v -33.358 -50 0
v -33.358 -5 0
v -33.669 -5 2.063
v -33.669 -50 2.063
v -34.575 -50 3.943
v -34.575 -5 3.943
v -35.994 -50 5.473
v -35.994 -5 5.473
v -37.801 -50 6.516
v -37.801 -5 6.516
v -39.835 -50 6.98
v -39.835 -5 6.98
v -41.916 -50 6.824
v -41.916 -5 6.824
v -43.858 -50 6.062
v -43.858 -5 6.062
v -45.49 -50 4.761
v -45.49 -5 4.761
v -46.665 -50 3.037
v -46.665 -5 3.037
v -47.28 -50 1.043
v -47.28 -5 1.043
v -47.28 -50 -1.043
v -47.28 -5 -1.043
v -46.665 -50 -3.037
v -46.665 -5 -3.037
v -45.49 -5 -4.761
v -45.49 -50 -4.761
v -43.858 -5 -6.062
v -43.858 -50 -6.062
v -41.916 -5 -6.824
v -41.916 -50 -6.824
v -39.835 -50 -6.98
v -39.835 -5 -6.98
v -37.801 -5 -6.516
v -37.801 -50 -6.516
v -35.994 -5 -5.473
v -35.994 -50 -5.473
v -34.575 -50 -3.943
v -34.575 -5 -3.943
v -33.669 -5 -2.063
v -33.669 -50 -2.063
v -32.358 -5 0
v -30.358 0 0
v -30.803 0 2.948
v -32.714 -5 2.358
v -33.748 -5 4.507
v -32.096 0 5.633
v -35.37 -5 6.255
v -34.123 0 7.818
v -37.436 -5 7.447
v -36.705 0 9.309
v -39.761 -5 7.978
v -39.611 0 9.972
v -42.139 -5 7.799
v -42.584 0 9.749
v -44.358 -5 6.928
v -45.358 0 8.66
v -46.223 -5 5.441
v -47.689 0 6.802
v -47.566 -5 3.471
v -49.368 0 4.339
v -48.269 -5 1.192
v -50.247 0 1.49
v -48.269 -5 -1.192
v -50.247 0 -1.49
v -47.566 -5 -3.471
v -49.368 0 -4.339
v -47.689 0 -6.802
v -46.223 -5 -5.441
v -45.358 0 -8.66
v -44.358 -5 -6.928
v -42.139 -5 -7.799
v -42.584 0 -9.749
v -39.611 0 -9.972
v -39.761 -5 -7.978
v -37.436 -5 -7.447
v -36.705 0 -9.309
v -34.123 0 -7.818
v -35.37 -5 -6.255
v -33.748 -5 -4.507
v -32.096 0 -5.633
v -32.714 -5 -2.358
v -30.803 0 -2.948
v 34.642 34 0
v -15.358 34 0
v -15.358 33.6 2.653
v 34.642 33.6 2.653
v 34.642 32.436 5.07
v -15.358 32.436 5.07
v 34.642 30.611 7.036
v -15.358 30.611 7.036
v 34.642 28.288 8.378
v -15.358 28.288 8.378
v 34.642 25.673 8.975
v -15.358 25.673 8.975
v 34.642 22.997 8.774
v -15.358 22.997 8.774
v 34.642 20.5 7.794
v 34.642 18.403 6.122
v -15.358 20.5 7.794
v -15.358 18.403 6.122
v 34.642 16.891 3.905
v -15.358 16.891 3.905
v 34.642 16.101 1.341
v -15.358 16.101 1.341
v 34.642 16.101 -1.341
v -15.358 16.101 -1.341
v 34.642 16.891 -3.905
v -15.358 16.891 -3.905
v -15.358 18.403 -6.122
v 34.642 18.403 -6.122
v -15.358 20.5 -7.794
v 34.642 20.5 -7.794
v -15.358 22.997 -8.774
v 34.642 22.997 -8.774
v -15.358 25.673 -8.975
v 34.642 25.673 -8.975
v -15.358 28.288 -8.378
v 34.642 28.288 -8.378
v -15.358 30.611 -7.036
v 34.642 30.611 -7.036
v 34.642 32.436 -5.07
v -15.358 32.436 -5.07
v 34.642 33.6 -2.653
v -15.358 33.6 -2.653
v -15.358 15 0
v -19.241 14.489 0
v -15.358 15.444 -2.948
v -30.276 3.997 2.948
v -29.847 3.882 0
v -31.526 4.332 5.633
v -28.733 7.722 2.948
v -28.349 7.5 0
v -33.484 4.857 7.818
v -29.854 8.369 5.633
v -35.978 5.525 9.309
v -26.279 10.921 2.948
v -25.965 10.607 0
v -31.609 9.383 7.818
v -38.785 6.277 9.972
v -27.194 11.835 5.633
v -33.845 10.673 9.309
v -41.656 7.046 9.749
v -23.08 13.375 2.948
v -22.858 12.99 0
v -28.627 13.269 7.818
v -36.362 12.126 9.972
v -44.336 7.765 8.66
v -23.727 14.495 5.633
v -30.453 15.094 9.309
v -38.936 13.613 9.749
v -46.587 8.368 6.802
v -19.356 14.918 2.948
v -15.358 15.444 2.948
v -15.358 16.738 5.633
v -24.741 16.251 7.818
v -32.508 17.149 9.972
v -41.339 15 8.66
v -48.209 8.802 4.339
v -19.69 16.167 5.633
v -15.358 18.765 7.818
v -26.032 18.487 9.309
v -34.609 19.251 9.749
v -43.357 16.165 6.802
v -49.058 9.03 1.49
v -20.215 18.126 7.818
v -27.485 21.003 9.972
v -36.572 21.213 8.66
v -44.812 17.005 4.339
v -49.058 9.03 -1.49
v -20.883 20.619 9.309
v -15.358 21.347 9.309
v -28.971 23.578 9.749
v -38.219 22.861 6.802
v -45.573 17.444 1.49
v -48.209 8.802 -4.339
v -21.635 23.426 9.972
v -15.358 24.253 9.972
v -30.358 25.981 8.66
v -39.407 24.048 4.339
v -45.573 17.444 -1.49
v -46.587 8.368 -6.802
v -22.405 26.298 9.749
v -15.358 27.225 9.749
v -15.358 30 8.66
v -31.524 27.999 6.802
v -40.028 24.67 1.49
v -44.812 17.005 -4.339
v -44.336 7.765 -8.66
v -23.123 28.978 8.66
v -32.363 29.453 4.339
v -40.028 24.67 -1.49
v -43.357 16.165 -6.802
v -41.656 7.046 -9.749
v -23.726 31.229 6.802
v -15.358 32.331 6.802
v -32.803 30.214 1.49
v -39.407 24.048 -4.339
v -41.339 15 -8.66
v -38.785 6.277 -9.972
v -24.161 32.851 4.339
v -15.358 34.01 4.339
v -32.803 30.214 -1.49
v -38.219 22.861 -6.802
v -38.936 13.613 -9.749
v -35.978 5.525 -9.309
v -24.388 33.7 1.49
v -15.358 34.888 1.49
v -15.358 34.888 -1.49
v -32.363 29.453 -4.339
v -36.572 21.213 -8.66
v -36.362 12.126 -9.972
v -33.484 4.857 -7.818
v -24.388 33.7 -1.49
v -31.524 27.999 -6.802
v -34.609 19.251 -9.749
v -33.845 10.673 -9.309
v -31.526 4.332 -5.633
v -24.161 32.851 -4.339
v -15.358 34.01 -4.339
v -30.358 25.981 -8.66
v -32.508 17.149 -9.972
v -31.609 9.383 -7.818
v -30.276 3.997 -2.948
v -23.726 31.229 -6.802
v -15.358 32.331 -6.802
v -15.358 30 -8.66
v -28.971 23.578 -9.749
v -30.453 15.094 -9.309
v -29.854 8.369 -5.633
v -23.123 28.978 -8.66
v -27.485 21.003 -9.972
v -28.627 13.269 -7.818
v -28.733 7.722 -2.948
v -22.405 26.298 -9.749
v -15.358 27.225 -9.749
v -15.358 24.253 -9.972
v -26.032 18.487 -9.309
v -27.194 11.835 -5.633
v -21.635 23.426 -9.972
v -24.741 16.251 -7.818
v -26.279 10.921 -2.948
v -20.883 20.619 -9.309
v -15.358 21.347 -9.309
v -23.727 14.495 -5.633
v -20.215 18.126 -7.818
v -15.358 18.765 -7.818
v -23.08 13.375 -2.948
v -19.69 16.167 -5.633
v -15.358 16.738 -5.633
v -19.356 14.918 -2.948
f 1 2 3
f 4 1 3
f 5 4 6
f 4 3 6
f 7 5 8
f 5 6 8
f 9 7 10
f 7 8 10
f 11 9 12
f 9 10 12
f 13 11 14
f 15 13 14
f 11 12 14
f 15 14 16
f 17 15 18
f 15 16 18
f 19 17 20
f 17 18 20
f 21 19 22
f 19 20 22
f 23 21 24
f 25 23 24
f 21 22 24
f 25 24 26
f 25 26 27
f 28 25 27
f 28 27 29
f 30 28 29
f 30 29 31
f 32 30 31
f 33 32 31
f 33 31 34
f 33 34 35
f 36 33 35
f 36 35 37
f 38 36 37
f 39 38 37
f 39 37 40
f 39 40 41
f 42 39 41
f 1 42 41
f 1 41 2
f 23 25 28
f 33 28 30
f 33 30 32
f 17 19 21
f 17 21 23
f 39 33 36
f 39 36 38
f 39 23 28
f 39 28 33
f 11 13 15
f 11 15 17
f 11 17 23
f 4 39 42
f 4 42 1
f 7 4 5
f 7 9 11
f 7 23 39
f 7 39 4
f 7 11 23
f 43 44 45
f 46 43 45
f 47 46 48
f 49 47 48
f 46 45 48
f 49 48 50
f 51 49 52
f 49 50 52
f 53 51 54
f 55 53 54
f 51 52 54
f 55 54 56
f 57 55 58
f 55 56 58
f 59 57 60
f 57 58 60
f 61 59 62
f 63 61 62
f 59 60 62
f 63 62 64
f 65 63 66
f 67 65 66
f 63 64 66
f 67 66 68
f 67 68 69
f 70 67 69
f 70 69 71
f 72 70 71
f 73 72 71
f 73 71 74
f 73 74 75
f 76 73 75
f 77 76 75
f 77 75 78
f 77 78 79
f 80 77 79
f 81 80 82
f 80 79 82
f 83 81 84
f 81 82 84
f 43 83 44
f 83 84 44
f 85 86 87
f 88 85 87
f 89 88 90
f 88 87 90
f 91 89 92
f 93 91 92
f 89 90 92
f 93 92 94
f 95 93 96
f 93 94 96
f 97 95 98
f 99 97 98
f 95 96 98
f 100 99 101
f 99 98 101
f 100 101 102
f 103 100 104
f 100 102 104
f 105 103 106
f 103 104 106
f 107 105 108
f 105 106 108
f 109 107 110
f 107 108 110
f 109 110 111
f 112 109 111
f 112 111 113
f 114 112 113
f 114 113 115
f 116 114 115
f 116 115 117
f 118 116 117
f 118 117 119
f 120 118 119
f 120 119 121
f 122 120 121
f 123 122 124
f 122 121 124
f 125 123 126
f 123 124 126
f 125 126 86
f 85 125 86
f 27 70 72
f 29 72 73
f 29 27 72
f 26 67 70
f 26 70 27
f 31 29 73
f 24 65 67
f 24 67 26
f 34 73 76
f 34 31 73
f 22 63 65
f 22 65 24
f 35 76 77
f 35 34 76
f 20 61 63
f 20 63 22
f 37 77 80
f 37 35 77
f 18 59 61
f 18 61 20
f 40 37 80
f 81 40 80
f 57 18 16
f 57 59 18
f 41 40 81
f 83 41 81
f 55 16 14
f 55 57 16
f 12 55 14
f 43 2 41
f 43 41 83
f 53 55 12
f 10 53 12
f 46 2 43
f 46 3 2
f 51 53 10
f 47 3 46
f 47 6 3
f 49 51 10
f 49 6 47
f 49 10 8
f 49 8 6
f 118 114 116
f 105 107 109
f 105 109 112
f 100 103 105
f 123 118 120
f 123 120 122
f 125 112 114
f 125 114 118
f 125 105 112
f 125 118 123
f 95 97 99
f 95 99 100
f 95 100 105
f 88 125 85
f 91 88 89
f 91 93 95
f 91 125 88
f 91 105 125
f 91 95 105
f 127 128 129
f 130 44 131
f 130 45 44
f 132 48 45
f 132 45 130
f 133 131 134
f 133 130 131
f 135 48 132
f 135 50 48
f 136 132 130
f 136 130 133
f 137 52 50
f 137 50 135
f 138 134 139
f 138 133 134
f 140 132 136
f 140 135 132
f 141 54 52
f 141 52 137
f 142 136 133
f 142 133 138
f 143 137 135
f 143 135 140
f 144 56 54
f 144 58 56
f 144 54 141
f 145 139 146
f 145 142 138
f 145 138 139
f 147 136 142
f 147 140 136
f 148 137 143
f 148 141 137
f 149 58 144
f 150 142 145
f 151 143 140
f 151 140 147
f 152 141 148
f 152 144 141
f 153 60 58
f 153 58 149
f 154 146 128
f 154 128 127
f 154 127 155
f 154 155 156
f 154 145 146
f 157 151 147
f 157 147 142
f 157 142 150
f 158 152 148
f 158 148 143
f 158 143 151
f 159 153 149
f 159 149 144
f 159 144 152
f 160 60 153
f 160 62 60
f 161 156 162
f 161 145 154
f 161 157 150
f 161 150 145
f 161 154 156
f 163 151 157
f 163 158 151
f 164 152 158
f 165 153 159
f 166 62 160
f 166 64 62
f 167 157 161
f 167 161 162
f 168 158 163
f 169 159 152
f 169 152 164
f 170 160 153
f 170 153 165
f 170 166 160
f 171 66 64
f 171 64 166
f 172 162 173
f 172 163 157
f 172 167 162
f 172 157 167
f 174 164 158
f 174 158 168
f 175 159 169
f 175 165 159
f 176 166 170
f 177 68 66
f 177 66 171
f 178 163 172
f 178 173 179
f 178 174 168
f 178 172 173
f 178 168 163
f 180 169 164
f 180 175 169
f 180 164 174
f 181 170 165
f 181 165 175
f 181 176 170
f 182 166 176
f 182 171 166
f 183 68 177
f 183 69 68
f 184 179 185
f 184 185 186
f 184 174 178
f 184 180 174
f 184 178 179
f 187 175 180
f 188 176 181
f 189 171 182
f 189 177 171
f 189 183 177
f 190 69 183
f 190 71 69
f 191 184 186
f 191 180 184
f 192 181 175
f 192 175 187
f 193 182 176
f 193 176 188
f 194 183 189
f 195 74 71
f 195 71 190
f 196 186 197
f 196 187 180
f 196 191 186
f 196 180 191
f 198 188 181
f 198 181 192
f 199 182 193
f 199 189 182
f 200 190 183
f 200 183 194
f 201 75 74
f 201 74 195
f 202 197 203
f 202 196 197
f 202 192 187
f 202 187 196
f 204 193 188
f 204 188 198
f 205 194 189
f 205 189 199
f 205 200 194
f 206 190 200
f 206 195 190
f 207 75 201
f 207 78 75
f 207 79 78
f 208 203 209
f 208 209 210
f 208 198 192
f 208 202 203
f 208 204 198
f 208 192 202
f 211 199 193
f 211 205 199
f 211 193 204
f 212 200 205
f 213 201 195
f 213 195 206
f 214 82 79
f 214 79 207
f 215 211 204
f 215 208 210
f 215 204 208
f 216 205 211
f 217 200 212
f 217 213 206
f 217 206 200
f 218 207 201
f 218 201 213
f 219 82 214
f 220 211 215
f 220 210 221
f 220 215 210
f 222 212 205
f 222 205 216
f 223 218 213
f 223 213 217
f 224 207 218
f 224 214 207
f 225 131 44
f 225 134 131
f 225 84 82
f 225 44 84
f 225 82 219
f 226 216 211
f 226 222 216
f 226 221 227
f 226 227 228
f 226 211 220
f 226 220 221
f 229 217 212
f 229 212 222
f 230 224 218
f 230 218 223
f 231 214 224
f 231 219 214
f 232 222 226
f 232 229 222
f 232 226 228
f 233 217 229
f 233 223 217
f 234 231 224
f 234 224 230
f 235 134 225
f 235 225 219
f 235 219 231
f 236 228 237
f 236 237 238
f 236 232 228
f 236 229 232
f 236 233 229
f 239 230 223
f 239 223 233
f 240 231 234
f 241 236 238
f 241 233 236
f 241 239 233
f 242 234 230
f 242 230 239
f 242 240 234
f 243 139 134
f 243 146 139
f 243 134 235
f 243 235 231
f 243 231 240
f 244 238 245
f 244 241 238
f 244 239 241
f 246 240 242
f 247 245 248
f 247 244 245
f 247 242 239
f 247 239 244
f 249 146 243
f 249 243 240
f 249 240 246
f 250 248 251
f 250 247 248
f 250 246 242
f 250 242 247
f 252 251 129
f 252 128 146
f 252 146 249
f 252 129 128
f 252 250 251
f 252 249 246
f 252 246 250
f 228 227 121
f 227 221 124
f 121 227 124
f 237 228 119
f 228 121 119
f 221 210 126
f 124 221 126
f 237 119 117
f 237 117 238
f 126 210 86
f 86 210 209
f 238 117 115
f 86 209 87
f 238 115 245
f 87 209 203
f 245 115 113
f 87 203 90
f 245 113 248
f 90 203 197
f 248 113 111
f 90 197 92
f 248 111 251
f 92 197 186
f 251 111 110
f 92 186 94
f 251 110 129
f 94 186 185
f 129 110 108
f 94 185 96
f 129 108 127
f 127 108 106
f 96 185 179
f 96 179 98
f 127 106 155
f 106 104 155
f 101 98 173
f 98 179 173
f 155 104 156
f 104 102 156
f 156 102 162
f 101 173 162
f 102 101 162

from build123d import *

# Parameters (mm, degrees)
F0_R     = 10
F3_ANGLE = 90
F4_R     = 7
F5_DEPTH = 50
F6_R     = 9
F7_DEPTH = 50
F8_DEPTH = 5
F9_SIZE2 = 4.99999
F9_SIZE  = 1.99999


# Not quite as in the source:
# - a fillet or chamfer is up to 0.001 mm smaller than in the source, because OpenCascade refuses the exact size


with BuildPart() as f3:
    # F0 (on Front) → F3 (revolve)
    with BuildSketch(Plane.XZ):
        with Locations((-40.3583608249, 0)):
            Circle(F0_R)
    revolve(axis=Axis((-15.3583608249, 0, 6.4160241745), (0, 0, -1)), revolution_arc=F3_ANGLE)

    # F6 (on face) → F7 (join)
    with BuildSketch(Plane.YZ.offset(-15.3583608249)):
        with Locations((25, 0)):
            Circle(F6_R)
    extrude(amount=F7_DEPTH)

    # F8 (add): a face of the model
    f8_faces = [f3.faces().sort_by_distance(p)[0] for p in [
        (-40.3583608249, 0, 0),
    ]]


with BuildPart() as f5:
    # F4 (on face) → F5 (new body)
    with BuildSketch(Plane.XZ):
        with Locations((-40.3583608249, 0)):
            Circle(F4_R)
    extrude(amount=F5_DEPTH)


with BuildPart() as f3_1:
    add(f3.part)

    add(f5.part)  # F8 merges F5
    extrude(f8_faces, amount=F8_DEPTH)

    # F9 (size 2 and 5 in the source; OpenCascade refuses exactly that, so slightly less here)
    f9_edges = [f3_1.edges().sort_by_distance(p)[0] for p in [
        (-50.358361, -5, 0),
    ]]
    f9_side = f3_1.faces().sort_by_distance((-50.075518, -5, 0))[0]
    chamfer(f9_edges, length=F9_SIZE, length2=F9_SIZE2, reference=f9_side)


solid = f3_1.part
